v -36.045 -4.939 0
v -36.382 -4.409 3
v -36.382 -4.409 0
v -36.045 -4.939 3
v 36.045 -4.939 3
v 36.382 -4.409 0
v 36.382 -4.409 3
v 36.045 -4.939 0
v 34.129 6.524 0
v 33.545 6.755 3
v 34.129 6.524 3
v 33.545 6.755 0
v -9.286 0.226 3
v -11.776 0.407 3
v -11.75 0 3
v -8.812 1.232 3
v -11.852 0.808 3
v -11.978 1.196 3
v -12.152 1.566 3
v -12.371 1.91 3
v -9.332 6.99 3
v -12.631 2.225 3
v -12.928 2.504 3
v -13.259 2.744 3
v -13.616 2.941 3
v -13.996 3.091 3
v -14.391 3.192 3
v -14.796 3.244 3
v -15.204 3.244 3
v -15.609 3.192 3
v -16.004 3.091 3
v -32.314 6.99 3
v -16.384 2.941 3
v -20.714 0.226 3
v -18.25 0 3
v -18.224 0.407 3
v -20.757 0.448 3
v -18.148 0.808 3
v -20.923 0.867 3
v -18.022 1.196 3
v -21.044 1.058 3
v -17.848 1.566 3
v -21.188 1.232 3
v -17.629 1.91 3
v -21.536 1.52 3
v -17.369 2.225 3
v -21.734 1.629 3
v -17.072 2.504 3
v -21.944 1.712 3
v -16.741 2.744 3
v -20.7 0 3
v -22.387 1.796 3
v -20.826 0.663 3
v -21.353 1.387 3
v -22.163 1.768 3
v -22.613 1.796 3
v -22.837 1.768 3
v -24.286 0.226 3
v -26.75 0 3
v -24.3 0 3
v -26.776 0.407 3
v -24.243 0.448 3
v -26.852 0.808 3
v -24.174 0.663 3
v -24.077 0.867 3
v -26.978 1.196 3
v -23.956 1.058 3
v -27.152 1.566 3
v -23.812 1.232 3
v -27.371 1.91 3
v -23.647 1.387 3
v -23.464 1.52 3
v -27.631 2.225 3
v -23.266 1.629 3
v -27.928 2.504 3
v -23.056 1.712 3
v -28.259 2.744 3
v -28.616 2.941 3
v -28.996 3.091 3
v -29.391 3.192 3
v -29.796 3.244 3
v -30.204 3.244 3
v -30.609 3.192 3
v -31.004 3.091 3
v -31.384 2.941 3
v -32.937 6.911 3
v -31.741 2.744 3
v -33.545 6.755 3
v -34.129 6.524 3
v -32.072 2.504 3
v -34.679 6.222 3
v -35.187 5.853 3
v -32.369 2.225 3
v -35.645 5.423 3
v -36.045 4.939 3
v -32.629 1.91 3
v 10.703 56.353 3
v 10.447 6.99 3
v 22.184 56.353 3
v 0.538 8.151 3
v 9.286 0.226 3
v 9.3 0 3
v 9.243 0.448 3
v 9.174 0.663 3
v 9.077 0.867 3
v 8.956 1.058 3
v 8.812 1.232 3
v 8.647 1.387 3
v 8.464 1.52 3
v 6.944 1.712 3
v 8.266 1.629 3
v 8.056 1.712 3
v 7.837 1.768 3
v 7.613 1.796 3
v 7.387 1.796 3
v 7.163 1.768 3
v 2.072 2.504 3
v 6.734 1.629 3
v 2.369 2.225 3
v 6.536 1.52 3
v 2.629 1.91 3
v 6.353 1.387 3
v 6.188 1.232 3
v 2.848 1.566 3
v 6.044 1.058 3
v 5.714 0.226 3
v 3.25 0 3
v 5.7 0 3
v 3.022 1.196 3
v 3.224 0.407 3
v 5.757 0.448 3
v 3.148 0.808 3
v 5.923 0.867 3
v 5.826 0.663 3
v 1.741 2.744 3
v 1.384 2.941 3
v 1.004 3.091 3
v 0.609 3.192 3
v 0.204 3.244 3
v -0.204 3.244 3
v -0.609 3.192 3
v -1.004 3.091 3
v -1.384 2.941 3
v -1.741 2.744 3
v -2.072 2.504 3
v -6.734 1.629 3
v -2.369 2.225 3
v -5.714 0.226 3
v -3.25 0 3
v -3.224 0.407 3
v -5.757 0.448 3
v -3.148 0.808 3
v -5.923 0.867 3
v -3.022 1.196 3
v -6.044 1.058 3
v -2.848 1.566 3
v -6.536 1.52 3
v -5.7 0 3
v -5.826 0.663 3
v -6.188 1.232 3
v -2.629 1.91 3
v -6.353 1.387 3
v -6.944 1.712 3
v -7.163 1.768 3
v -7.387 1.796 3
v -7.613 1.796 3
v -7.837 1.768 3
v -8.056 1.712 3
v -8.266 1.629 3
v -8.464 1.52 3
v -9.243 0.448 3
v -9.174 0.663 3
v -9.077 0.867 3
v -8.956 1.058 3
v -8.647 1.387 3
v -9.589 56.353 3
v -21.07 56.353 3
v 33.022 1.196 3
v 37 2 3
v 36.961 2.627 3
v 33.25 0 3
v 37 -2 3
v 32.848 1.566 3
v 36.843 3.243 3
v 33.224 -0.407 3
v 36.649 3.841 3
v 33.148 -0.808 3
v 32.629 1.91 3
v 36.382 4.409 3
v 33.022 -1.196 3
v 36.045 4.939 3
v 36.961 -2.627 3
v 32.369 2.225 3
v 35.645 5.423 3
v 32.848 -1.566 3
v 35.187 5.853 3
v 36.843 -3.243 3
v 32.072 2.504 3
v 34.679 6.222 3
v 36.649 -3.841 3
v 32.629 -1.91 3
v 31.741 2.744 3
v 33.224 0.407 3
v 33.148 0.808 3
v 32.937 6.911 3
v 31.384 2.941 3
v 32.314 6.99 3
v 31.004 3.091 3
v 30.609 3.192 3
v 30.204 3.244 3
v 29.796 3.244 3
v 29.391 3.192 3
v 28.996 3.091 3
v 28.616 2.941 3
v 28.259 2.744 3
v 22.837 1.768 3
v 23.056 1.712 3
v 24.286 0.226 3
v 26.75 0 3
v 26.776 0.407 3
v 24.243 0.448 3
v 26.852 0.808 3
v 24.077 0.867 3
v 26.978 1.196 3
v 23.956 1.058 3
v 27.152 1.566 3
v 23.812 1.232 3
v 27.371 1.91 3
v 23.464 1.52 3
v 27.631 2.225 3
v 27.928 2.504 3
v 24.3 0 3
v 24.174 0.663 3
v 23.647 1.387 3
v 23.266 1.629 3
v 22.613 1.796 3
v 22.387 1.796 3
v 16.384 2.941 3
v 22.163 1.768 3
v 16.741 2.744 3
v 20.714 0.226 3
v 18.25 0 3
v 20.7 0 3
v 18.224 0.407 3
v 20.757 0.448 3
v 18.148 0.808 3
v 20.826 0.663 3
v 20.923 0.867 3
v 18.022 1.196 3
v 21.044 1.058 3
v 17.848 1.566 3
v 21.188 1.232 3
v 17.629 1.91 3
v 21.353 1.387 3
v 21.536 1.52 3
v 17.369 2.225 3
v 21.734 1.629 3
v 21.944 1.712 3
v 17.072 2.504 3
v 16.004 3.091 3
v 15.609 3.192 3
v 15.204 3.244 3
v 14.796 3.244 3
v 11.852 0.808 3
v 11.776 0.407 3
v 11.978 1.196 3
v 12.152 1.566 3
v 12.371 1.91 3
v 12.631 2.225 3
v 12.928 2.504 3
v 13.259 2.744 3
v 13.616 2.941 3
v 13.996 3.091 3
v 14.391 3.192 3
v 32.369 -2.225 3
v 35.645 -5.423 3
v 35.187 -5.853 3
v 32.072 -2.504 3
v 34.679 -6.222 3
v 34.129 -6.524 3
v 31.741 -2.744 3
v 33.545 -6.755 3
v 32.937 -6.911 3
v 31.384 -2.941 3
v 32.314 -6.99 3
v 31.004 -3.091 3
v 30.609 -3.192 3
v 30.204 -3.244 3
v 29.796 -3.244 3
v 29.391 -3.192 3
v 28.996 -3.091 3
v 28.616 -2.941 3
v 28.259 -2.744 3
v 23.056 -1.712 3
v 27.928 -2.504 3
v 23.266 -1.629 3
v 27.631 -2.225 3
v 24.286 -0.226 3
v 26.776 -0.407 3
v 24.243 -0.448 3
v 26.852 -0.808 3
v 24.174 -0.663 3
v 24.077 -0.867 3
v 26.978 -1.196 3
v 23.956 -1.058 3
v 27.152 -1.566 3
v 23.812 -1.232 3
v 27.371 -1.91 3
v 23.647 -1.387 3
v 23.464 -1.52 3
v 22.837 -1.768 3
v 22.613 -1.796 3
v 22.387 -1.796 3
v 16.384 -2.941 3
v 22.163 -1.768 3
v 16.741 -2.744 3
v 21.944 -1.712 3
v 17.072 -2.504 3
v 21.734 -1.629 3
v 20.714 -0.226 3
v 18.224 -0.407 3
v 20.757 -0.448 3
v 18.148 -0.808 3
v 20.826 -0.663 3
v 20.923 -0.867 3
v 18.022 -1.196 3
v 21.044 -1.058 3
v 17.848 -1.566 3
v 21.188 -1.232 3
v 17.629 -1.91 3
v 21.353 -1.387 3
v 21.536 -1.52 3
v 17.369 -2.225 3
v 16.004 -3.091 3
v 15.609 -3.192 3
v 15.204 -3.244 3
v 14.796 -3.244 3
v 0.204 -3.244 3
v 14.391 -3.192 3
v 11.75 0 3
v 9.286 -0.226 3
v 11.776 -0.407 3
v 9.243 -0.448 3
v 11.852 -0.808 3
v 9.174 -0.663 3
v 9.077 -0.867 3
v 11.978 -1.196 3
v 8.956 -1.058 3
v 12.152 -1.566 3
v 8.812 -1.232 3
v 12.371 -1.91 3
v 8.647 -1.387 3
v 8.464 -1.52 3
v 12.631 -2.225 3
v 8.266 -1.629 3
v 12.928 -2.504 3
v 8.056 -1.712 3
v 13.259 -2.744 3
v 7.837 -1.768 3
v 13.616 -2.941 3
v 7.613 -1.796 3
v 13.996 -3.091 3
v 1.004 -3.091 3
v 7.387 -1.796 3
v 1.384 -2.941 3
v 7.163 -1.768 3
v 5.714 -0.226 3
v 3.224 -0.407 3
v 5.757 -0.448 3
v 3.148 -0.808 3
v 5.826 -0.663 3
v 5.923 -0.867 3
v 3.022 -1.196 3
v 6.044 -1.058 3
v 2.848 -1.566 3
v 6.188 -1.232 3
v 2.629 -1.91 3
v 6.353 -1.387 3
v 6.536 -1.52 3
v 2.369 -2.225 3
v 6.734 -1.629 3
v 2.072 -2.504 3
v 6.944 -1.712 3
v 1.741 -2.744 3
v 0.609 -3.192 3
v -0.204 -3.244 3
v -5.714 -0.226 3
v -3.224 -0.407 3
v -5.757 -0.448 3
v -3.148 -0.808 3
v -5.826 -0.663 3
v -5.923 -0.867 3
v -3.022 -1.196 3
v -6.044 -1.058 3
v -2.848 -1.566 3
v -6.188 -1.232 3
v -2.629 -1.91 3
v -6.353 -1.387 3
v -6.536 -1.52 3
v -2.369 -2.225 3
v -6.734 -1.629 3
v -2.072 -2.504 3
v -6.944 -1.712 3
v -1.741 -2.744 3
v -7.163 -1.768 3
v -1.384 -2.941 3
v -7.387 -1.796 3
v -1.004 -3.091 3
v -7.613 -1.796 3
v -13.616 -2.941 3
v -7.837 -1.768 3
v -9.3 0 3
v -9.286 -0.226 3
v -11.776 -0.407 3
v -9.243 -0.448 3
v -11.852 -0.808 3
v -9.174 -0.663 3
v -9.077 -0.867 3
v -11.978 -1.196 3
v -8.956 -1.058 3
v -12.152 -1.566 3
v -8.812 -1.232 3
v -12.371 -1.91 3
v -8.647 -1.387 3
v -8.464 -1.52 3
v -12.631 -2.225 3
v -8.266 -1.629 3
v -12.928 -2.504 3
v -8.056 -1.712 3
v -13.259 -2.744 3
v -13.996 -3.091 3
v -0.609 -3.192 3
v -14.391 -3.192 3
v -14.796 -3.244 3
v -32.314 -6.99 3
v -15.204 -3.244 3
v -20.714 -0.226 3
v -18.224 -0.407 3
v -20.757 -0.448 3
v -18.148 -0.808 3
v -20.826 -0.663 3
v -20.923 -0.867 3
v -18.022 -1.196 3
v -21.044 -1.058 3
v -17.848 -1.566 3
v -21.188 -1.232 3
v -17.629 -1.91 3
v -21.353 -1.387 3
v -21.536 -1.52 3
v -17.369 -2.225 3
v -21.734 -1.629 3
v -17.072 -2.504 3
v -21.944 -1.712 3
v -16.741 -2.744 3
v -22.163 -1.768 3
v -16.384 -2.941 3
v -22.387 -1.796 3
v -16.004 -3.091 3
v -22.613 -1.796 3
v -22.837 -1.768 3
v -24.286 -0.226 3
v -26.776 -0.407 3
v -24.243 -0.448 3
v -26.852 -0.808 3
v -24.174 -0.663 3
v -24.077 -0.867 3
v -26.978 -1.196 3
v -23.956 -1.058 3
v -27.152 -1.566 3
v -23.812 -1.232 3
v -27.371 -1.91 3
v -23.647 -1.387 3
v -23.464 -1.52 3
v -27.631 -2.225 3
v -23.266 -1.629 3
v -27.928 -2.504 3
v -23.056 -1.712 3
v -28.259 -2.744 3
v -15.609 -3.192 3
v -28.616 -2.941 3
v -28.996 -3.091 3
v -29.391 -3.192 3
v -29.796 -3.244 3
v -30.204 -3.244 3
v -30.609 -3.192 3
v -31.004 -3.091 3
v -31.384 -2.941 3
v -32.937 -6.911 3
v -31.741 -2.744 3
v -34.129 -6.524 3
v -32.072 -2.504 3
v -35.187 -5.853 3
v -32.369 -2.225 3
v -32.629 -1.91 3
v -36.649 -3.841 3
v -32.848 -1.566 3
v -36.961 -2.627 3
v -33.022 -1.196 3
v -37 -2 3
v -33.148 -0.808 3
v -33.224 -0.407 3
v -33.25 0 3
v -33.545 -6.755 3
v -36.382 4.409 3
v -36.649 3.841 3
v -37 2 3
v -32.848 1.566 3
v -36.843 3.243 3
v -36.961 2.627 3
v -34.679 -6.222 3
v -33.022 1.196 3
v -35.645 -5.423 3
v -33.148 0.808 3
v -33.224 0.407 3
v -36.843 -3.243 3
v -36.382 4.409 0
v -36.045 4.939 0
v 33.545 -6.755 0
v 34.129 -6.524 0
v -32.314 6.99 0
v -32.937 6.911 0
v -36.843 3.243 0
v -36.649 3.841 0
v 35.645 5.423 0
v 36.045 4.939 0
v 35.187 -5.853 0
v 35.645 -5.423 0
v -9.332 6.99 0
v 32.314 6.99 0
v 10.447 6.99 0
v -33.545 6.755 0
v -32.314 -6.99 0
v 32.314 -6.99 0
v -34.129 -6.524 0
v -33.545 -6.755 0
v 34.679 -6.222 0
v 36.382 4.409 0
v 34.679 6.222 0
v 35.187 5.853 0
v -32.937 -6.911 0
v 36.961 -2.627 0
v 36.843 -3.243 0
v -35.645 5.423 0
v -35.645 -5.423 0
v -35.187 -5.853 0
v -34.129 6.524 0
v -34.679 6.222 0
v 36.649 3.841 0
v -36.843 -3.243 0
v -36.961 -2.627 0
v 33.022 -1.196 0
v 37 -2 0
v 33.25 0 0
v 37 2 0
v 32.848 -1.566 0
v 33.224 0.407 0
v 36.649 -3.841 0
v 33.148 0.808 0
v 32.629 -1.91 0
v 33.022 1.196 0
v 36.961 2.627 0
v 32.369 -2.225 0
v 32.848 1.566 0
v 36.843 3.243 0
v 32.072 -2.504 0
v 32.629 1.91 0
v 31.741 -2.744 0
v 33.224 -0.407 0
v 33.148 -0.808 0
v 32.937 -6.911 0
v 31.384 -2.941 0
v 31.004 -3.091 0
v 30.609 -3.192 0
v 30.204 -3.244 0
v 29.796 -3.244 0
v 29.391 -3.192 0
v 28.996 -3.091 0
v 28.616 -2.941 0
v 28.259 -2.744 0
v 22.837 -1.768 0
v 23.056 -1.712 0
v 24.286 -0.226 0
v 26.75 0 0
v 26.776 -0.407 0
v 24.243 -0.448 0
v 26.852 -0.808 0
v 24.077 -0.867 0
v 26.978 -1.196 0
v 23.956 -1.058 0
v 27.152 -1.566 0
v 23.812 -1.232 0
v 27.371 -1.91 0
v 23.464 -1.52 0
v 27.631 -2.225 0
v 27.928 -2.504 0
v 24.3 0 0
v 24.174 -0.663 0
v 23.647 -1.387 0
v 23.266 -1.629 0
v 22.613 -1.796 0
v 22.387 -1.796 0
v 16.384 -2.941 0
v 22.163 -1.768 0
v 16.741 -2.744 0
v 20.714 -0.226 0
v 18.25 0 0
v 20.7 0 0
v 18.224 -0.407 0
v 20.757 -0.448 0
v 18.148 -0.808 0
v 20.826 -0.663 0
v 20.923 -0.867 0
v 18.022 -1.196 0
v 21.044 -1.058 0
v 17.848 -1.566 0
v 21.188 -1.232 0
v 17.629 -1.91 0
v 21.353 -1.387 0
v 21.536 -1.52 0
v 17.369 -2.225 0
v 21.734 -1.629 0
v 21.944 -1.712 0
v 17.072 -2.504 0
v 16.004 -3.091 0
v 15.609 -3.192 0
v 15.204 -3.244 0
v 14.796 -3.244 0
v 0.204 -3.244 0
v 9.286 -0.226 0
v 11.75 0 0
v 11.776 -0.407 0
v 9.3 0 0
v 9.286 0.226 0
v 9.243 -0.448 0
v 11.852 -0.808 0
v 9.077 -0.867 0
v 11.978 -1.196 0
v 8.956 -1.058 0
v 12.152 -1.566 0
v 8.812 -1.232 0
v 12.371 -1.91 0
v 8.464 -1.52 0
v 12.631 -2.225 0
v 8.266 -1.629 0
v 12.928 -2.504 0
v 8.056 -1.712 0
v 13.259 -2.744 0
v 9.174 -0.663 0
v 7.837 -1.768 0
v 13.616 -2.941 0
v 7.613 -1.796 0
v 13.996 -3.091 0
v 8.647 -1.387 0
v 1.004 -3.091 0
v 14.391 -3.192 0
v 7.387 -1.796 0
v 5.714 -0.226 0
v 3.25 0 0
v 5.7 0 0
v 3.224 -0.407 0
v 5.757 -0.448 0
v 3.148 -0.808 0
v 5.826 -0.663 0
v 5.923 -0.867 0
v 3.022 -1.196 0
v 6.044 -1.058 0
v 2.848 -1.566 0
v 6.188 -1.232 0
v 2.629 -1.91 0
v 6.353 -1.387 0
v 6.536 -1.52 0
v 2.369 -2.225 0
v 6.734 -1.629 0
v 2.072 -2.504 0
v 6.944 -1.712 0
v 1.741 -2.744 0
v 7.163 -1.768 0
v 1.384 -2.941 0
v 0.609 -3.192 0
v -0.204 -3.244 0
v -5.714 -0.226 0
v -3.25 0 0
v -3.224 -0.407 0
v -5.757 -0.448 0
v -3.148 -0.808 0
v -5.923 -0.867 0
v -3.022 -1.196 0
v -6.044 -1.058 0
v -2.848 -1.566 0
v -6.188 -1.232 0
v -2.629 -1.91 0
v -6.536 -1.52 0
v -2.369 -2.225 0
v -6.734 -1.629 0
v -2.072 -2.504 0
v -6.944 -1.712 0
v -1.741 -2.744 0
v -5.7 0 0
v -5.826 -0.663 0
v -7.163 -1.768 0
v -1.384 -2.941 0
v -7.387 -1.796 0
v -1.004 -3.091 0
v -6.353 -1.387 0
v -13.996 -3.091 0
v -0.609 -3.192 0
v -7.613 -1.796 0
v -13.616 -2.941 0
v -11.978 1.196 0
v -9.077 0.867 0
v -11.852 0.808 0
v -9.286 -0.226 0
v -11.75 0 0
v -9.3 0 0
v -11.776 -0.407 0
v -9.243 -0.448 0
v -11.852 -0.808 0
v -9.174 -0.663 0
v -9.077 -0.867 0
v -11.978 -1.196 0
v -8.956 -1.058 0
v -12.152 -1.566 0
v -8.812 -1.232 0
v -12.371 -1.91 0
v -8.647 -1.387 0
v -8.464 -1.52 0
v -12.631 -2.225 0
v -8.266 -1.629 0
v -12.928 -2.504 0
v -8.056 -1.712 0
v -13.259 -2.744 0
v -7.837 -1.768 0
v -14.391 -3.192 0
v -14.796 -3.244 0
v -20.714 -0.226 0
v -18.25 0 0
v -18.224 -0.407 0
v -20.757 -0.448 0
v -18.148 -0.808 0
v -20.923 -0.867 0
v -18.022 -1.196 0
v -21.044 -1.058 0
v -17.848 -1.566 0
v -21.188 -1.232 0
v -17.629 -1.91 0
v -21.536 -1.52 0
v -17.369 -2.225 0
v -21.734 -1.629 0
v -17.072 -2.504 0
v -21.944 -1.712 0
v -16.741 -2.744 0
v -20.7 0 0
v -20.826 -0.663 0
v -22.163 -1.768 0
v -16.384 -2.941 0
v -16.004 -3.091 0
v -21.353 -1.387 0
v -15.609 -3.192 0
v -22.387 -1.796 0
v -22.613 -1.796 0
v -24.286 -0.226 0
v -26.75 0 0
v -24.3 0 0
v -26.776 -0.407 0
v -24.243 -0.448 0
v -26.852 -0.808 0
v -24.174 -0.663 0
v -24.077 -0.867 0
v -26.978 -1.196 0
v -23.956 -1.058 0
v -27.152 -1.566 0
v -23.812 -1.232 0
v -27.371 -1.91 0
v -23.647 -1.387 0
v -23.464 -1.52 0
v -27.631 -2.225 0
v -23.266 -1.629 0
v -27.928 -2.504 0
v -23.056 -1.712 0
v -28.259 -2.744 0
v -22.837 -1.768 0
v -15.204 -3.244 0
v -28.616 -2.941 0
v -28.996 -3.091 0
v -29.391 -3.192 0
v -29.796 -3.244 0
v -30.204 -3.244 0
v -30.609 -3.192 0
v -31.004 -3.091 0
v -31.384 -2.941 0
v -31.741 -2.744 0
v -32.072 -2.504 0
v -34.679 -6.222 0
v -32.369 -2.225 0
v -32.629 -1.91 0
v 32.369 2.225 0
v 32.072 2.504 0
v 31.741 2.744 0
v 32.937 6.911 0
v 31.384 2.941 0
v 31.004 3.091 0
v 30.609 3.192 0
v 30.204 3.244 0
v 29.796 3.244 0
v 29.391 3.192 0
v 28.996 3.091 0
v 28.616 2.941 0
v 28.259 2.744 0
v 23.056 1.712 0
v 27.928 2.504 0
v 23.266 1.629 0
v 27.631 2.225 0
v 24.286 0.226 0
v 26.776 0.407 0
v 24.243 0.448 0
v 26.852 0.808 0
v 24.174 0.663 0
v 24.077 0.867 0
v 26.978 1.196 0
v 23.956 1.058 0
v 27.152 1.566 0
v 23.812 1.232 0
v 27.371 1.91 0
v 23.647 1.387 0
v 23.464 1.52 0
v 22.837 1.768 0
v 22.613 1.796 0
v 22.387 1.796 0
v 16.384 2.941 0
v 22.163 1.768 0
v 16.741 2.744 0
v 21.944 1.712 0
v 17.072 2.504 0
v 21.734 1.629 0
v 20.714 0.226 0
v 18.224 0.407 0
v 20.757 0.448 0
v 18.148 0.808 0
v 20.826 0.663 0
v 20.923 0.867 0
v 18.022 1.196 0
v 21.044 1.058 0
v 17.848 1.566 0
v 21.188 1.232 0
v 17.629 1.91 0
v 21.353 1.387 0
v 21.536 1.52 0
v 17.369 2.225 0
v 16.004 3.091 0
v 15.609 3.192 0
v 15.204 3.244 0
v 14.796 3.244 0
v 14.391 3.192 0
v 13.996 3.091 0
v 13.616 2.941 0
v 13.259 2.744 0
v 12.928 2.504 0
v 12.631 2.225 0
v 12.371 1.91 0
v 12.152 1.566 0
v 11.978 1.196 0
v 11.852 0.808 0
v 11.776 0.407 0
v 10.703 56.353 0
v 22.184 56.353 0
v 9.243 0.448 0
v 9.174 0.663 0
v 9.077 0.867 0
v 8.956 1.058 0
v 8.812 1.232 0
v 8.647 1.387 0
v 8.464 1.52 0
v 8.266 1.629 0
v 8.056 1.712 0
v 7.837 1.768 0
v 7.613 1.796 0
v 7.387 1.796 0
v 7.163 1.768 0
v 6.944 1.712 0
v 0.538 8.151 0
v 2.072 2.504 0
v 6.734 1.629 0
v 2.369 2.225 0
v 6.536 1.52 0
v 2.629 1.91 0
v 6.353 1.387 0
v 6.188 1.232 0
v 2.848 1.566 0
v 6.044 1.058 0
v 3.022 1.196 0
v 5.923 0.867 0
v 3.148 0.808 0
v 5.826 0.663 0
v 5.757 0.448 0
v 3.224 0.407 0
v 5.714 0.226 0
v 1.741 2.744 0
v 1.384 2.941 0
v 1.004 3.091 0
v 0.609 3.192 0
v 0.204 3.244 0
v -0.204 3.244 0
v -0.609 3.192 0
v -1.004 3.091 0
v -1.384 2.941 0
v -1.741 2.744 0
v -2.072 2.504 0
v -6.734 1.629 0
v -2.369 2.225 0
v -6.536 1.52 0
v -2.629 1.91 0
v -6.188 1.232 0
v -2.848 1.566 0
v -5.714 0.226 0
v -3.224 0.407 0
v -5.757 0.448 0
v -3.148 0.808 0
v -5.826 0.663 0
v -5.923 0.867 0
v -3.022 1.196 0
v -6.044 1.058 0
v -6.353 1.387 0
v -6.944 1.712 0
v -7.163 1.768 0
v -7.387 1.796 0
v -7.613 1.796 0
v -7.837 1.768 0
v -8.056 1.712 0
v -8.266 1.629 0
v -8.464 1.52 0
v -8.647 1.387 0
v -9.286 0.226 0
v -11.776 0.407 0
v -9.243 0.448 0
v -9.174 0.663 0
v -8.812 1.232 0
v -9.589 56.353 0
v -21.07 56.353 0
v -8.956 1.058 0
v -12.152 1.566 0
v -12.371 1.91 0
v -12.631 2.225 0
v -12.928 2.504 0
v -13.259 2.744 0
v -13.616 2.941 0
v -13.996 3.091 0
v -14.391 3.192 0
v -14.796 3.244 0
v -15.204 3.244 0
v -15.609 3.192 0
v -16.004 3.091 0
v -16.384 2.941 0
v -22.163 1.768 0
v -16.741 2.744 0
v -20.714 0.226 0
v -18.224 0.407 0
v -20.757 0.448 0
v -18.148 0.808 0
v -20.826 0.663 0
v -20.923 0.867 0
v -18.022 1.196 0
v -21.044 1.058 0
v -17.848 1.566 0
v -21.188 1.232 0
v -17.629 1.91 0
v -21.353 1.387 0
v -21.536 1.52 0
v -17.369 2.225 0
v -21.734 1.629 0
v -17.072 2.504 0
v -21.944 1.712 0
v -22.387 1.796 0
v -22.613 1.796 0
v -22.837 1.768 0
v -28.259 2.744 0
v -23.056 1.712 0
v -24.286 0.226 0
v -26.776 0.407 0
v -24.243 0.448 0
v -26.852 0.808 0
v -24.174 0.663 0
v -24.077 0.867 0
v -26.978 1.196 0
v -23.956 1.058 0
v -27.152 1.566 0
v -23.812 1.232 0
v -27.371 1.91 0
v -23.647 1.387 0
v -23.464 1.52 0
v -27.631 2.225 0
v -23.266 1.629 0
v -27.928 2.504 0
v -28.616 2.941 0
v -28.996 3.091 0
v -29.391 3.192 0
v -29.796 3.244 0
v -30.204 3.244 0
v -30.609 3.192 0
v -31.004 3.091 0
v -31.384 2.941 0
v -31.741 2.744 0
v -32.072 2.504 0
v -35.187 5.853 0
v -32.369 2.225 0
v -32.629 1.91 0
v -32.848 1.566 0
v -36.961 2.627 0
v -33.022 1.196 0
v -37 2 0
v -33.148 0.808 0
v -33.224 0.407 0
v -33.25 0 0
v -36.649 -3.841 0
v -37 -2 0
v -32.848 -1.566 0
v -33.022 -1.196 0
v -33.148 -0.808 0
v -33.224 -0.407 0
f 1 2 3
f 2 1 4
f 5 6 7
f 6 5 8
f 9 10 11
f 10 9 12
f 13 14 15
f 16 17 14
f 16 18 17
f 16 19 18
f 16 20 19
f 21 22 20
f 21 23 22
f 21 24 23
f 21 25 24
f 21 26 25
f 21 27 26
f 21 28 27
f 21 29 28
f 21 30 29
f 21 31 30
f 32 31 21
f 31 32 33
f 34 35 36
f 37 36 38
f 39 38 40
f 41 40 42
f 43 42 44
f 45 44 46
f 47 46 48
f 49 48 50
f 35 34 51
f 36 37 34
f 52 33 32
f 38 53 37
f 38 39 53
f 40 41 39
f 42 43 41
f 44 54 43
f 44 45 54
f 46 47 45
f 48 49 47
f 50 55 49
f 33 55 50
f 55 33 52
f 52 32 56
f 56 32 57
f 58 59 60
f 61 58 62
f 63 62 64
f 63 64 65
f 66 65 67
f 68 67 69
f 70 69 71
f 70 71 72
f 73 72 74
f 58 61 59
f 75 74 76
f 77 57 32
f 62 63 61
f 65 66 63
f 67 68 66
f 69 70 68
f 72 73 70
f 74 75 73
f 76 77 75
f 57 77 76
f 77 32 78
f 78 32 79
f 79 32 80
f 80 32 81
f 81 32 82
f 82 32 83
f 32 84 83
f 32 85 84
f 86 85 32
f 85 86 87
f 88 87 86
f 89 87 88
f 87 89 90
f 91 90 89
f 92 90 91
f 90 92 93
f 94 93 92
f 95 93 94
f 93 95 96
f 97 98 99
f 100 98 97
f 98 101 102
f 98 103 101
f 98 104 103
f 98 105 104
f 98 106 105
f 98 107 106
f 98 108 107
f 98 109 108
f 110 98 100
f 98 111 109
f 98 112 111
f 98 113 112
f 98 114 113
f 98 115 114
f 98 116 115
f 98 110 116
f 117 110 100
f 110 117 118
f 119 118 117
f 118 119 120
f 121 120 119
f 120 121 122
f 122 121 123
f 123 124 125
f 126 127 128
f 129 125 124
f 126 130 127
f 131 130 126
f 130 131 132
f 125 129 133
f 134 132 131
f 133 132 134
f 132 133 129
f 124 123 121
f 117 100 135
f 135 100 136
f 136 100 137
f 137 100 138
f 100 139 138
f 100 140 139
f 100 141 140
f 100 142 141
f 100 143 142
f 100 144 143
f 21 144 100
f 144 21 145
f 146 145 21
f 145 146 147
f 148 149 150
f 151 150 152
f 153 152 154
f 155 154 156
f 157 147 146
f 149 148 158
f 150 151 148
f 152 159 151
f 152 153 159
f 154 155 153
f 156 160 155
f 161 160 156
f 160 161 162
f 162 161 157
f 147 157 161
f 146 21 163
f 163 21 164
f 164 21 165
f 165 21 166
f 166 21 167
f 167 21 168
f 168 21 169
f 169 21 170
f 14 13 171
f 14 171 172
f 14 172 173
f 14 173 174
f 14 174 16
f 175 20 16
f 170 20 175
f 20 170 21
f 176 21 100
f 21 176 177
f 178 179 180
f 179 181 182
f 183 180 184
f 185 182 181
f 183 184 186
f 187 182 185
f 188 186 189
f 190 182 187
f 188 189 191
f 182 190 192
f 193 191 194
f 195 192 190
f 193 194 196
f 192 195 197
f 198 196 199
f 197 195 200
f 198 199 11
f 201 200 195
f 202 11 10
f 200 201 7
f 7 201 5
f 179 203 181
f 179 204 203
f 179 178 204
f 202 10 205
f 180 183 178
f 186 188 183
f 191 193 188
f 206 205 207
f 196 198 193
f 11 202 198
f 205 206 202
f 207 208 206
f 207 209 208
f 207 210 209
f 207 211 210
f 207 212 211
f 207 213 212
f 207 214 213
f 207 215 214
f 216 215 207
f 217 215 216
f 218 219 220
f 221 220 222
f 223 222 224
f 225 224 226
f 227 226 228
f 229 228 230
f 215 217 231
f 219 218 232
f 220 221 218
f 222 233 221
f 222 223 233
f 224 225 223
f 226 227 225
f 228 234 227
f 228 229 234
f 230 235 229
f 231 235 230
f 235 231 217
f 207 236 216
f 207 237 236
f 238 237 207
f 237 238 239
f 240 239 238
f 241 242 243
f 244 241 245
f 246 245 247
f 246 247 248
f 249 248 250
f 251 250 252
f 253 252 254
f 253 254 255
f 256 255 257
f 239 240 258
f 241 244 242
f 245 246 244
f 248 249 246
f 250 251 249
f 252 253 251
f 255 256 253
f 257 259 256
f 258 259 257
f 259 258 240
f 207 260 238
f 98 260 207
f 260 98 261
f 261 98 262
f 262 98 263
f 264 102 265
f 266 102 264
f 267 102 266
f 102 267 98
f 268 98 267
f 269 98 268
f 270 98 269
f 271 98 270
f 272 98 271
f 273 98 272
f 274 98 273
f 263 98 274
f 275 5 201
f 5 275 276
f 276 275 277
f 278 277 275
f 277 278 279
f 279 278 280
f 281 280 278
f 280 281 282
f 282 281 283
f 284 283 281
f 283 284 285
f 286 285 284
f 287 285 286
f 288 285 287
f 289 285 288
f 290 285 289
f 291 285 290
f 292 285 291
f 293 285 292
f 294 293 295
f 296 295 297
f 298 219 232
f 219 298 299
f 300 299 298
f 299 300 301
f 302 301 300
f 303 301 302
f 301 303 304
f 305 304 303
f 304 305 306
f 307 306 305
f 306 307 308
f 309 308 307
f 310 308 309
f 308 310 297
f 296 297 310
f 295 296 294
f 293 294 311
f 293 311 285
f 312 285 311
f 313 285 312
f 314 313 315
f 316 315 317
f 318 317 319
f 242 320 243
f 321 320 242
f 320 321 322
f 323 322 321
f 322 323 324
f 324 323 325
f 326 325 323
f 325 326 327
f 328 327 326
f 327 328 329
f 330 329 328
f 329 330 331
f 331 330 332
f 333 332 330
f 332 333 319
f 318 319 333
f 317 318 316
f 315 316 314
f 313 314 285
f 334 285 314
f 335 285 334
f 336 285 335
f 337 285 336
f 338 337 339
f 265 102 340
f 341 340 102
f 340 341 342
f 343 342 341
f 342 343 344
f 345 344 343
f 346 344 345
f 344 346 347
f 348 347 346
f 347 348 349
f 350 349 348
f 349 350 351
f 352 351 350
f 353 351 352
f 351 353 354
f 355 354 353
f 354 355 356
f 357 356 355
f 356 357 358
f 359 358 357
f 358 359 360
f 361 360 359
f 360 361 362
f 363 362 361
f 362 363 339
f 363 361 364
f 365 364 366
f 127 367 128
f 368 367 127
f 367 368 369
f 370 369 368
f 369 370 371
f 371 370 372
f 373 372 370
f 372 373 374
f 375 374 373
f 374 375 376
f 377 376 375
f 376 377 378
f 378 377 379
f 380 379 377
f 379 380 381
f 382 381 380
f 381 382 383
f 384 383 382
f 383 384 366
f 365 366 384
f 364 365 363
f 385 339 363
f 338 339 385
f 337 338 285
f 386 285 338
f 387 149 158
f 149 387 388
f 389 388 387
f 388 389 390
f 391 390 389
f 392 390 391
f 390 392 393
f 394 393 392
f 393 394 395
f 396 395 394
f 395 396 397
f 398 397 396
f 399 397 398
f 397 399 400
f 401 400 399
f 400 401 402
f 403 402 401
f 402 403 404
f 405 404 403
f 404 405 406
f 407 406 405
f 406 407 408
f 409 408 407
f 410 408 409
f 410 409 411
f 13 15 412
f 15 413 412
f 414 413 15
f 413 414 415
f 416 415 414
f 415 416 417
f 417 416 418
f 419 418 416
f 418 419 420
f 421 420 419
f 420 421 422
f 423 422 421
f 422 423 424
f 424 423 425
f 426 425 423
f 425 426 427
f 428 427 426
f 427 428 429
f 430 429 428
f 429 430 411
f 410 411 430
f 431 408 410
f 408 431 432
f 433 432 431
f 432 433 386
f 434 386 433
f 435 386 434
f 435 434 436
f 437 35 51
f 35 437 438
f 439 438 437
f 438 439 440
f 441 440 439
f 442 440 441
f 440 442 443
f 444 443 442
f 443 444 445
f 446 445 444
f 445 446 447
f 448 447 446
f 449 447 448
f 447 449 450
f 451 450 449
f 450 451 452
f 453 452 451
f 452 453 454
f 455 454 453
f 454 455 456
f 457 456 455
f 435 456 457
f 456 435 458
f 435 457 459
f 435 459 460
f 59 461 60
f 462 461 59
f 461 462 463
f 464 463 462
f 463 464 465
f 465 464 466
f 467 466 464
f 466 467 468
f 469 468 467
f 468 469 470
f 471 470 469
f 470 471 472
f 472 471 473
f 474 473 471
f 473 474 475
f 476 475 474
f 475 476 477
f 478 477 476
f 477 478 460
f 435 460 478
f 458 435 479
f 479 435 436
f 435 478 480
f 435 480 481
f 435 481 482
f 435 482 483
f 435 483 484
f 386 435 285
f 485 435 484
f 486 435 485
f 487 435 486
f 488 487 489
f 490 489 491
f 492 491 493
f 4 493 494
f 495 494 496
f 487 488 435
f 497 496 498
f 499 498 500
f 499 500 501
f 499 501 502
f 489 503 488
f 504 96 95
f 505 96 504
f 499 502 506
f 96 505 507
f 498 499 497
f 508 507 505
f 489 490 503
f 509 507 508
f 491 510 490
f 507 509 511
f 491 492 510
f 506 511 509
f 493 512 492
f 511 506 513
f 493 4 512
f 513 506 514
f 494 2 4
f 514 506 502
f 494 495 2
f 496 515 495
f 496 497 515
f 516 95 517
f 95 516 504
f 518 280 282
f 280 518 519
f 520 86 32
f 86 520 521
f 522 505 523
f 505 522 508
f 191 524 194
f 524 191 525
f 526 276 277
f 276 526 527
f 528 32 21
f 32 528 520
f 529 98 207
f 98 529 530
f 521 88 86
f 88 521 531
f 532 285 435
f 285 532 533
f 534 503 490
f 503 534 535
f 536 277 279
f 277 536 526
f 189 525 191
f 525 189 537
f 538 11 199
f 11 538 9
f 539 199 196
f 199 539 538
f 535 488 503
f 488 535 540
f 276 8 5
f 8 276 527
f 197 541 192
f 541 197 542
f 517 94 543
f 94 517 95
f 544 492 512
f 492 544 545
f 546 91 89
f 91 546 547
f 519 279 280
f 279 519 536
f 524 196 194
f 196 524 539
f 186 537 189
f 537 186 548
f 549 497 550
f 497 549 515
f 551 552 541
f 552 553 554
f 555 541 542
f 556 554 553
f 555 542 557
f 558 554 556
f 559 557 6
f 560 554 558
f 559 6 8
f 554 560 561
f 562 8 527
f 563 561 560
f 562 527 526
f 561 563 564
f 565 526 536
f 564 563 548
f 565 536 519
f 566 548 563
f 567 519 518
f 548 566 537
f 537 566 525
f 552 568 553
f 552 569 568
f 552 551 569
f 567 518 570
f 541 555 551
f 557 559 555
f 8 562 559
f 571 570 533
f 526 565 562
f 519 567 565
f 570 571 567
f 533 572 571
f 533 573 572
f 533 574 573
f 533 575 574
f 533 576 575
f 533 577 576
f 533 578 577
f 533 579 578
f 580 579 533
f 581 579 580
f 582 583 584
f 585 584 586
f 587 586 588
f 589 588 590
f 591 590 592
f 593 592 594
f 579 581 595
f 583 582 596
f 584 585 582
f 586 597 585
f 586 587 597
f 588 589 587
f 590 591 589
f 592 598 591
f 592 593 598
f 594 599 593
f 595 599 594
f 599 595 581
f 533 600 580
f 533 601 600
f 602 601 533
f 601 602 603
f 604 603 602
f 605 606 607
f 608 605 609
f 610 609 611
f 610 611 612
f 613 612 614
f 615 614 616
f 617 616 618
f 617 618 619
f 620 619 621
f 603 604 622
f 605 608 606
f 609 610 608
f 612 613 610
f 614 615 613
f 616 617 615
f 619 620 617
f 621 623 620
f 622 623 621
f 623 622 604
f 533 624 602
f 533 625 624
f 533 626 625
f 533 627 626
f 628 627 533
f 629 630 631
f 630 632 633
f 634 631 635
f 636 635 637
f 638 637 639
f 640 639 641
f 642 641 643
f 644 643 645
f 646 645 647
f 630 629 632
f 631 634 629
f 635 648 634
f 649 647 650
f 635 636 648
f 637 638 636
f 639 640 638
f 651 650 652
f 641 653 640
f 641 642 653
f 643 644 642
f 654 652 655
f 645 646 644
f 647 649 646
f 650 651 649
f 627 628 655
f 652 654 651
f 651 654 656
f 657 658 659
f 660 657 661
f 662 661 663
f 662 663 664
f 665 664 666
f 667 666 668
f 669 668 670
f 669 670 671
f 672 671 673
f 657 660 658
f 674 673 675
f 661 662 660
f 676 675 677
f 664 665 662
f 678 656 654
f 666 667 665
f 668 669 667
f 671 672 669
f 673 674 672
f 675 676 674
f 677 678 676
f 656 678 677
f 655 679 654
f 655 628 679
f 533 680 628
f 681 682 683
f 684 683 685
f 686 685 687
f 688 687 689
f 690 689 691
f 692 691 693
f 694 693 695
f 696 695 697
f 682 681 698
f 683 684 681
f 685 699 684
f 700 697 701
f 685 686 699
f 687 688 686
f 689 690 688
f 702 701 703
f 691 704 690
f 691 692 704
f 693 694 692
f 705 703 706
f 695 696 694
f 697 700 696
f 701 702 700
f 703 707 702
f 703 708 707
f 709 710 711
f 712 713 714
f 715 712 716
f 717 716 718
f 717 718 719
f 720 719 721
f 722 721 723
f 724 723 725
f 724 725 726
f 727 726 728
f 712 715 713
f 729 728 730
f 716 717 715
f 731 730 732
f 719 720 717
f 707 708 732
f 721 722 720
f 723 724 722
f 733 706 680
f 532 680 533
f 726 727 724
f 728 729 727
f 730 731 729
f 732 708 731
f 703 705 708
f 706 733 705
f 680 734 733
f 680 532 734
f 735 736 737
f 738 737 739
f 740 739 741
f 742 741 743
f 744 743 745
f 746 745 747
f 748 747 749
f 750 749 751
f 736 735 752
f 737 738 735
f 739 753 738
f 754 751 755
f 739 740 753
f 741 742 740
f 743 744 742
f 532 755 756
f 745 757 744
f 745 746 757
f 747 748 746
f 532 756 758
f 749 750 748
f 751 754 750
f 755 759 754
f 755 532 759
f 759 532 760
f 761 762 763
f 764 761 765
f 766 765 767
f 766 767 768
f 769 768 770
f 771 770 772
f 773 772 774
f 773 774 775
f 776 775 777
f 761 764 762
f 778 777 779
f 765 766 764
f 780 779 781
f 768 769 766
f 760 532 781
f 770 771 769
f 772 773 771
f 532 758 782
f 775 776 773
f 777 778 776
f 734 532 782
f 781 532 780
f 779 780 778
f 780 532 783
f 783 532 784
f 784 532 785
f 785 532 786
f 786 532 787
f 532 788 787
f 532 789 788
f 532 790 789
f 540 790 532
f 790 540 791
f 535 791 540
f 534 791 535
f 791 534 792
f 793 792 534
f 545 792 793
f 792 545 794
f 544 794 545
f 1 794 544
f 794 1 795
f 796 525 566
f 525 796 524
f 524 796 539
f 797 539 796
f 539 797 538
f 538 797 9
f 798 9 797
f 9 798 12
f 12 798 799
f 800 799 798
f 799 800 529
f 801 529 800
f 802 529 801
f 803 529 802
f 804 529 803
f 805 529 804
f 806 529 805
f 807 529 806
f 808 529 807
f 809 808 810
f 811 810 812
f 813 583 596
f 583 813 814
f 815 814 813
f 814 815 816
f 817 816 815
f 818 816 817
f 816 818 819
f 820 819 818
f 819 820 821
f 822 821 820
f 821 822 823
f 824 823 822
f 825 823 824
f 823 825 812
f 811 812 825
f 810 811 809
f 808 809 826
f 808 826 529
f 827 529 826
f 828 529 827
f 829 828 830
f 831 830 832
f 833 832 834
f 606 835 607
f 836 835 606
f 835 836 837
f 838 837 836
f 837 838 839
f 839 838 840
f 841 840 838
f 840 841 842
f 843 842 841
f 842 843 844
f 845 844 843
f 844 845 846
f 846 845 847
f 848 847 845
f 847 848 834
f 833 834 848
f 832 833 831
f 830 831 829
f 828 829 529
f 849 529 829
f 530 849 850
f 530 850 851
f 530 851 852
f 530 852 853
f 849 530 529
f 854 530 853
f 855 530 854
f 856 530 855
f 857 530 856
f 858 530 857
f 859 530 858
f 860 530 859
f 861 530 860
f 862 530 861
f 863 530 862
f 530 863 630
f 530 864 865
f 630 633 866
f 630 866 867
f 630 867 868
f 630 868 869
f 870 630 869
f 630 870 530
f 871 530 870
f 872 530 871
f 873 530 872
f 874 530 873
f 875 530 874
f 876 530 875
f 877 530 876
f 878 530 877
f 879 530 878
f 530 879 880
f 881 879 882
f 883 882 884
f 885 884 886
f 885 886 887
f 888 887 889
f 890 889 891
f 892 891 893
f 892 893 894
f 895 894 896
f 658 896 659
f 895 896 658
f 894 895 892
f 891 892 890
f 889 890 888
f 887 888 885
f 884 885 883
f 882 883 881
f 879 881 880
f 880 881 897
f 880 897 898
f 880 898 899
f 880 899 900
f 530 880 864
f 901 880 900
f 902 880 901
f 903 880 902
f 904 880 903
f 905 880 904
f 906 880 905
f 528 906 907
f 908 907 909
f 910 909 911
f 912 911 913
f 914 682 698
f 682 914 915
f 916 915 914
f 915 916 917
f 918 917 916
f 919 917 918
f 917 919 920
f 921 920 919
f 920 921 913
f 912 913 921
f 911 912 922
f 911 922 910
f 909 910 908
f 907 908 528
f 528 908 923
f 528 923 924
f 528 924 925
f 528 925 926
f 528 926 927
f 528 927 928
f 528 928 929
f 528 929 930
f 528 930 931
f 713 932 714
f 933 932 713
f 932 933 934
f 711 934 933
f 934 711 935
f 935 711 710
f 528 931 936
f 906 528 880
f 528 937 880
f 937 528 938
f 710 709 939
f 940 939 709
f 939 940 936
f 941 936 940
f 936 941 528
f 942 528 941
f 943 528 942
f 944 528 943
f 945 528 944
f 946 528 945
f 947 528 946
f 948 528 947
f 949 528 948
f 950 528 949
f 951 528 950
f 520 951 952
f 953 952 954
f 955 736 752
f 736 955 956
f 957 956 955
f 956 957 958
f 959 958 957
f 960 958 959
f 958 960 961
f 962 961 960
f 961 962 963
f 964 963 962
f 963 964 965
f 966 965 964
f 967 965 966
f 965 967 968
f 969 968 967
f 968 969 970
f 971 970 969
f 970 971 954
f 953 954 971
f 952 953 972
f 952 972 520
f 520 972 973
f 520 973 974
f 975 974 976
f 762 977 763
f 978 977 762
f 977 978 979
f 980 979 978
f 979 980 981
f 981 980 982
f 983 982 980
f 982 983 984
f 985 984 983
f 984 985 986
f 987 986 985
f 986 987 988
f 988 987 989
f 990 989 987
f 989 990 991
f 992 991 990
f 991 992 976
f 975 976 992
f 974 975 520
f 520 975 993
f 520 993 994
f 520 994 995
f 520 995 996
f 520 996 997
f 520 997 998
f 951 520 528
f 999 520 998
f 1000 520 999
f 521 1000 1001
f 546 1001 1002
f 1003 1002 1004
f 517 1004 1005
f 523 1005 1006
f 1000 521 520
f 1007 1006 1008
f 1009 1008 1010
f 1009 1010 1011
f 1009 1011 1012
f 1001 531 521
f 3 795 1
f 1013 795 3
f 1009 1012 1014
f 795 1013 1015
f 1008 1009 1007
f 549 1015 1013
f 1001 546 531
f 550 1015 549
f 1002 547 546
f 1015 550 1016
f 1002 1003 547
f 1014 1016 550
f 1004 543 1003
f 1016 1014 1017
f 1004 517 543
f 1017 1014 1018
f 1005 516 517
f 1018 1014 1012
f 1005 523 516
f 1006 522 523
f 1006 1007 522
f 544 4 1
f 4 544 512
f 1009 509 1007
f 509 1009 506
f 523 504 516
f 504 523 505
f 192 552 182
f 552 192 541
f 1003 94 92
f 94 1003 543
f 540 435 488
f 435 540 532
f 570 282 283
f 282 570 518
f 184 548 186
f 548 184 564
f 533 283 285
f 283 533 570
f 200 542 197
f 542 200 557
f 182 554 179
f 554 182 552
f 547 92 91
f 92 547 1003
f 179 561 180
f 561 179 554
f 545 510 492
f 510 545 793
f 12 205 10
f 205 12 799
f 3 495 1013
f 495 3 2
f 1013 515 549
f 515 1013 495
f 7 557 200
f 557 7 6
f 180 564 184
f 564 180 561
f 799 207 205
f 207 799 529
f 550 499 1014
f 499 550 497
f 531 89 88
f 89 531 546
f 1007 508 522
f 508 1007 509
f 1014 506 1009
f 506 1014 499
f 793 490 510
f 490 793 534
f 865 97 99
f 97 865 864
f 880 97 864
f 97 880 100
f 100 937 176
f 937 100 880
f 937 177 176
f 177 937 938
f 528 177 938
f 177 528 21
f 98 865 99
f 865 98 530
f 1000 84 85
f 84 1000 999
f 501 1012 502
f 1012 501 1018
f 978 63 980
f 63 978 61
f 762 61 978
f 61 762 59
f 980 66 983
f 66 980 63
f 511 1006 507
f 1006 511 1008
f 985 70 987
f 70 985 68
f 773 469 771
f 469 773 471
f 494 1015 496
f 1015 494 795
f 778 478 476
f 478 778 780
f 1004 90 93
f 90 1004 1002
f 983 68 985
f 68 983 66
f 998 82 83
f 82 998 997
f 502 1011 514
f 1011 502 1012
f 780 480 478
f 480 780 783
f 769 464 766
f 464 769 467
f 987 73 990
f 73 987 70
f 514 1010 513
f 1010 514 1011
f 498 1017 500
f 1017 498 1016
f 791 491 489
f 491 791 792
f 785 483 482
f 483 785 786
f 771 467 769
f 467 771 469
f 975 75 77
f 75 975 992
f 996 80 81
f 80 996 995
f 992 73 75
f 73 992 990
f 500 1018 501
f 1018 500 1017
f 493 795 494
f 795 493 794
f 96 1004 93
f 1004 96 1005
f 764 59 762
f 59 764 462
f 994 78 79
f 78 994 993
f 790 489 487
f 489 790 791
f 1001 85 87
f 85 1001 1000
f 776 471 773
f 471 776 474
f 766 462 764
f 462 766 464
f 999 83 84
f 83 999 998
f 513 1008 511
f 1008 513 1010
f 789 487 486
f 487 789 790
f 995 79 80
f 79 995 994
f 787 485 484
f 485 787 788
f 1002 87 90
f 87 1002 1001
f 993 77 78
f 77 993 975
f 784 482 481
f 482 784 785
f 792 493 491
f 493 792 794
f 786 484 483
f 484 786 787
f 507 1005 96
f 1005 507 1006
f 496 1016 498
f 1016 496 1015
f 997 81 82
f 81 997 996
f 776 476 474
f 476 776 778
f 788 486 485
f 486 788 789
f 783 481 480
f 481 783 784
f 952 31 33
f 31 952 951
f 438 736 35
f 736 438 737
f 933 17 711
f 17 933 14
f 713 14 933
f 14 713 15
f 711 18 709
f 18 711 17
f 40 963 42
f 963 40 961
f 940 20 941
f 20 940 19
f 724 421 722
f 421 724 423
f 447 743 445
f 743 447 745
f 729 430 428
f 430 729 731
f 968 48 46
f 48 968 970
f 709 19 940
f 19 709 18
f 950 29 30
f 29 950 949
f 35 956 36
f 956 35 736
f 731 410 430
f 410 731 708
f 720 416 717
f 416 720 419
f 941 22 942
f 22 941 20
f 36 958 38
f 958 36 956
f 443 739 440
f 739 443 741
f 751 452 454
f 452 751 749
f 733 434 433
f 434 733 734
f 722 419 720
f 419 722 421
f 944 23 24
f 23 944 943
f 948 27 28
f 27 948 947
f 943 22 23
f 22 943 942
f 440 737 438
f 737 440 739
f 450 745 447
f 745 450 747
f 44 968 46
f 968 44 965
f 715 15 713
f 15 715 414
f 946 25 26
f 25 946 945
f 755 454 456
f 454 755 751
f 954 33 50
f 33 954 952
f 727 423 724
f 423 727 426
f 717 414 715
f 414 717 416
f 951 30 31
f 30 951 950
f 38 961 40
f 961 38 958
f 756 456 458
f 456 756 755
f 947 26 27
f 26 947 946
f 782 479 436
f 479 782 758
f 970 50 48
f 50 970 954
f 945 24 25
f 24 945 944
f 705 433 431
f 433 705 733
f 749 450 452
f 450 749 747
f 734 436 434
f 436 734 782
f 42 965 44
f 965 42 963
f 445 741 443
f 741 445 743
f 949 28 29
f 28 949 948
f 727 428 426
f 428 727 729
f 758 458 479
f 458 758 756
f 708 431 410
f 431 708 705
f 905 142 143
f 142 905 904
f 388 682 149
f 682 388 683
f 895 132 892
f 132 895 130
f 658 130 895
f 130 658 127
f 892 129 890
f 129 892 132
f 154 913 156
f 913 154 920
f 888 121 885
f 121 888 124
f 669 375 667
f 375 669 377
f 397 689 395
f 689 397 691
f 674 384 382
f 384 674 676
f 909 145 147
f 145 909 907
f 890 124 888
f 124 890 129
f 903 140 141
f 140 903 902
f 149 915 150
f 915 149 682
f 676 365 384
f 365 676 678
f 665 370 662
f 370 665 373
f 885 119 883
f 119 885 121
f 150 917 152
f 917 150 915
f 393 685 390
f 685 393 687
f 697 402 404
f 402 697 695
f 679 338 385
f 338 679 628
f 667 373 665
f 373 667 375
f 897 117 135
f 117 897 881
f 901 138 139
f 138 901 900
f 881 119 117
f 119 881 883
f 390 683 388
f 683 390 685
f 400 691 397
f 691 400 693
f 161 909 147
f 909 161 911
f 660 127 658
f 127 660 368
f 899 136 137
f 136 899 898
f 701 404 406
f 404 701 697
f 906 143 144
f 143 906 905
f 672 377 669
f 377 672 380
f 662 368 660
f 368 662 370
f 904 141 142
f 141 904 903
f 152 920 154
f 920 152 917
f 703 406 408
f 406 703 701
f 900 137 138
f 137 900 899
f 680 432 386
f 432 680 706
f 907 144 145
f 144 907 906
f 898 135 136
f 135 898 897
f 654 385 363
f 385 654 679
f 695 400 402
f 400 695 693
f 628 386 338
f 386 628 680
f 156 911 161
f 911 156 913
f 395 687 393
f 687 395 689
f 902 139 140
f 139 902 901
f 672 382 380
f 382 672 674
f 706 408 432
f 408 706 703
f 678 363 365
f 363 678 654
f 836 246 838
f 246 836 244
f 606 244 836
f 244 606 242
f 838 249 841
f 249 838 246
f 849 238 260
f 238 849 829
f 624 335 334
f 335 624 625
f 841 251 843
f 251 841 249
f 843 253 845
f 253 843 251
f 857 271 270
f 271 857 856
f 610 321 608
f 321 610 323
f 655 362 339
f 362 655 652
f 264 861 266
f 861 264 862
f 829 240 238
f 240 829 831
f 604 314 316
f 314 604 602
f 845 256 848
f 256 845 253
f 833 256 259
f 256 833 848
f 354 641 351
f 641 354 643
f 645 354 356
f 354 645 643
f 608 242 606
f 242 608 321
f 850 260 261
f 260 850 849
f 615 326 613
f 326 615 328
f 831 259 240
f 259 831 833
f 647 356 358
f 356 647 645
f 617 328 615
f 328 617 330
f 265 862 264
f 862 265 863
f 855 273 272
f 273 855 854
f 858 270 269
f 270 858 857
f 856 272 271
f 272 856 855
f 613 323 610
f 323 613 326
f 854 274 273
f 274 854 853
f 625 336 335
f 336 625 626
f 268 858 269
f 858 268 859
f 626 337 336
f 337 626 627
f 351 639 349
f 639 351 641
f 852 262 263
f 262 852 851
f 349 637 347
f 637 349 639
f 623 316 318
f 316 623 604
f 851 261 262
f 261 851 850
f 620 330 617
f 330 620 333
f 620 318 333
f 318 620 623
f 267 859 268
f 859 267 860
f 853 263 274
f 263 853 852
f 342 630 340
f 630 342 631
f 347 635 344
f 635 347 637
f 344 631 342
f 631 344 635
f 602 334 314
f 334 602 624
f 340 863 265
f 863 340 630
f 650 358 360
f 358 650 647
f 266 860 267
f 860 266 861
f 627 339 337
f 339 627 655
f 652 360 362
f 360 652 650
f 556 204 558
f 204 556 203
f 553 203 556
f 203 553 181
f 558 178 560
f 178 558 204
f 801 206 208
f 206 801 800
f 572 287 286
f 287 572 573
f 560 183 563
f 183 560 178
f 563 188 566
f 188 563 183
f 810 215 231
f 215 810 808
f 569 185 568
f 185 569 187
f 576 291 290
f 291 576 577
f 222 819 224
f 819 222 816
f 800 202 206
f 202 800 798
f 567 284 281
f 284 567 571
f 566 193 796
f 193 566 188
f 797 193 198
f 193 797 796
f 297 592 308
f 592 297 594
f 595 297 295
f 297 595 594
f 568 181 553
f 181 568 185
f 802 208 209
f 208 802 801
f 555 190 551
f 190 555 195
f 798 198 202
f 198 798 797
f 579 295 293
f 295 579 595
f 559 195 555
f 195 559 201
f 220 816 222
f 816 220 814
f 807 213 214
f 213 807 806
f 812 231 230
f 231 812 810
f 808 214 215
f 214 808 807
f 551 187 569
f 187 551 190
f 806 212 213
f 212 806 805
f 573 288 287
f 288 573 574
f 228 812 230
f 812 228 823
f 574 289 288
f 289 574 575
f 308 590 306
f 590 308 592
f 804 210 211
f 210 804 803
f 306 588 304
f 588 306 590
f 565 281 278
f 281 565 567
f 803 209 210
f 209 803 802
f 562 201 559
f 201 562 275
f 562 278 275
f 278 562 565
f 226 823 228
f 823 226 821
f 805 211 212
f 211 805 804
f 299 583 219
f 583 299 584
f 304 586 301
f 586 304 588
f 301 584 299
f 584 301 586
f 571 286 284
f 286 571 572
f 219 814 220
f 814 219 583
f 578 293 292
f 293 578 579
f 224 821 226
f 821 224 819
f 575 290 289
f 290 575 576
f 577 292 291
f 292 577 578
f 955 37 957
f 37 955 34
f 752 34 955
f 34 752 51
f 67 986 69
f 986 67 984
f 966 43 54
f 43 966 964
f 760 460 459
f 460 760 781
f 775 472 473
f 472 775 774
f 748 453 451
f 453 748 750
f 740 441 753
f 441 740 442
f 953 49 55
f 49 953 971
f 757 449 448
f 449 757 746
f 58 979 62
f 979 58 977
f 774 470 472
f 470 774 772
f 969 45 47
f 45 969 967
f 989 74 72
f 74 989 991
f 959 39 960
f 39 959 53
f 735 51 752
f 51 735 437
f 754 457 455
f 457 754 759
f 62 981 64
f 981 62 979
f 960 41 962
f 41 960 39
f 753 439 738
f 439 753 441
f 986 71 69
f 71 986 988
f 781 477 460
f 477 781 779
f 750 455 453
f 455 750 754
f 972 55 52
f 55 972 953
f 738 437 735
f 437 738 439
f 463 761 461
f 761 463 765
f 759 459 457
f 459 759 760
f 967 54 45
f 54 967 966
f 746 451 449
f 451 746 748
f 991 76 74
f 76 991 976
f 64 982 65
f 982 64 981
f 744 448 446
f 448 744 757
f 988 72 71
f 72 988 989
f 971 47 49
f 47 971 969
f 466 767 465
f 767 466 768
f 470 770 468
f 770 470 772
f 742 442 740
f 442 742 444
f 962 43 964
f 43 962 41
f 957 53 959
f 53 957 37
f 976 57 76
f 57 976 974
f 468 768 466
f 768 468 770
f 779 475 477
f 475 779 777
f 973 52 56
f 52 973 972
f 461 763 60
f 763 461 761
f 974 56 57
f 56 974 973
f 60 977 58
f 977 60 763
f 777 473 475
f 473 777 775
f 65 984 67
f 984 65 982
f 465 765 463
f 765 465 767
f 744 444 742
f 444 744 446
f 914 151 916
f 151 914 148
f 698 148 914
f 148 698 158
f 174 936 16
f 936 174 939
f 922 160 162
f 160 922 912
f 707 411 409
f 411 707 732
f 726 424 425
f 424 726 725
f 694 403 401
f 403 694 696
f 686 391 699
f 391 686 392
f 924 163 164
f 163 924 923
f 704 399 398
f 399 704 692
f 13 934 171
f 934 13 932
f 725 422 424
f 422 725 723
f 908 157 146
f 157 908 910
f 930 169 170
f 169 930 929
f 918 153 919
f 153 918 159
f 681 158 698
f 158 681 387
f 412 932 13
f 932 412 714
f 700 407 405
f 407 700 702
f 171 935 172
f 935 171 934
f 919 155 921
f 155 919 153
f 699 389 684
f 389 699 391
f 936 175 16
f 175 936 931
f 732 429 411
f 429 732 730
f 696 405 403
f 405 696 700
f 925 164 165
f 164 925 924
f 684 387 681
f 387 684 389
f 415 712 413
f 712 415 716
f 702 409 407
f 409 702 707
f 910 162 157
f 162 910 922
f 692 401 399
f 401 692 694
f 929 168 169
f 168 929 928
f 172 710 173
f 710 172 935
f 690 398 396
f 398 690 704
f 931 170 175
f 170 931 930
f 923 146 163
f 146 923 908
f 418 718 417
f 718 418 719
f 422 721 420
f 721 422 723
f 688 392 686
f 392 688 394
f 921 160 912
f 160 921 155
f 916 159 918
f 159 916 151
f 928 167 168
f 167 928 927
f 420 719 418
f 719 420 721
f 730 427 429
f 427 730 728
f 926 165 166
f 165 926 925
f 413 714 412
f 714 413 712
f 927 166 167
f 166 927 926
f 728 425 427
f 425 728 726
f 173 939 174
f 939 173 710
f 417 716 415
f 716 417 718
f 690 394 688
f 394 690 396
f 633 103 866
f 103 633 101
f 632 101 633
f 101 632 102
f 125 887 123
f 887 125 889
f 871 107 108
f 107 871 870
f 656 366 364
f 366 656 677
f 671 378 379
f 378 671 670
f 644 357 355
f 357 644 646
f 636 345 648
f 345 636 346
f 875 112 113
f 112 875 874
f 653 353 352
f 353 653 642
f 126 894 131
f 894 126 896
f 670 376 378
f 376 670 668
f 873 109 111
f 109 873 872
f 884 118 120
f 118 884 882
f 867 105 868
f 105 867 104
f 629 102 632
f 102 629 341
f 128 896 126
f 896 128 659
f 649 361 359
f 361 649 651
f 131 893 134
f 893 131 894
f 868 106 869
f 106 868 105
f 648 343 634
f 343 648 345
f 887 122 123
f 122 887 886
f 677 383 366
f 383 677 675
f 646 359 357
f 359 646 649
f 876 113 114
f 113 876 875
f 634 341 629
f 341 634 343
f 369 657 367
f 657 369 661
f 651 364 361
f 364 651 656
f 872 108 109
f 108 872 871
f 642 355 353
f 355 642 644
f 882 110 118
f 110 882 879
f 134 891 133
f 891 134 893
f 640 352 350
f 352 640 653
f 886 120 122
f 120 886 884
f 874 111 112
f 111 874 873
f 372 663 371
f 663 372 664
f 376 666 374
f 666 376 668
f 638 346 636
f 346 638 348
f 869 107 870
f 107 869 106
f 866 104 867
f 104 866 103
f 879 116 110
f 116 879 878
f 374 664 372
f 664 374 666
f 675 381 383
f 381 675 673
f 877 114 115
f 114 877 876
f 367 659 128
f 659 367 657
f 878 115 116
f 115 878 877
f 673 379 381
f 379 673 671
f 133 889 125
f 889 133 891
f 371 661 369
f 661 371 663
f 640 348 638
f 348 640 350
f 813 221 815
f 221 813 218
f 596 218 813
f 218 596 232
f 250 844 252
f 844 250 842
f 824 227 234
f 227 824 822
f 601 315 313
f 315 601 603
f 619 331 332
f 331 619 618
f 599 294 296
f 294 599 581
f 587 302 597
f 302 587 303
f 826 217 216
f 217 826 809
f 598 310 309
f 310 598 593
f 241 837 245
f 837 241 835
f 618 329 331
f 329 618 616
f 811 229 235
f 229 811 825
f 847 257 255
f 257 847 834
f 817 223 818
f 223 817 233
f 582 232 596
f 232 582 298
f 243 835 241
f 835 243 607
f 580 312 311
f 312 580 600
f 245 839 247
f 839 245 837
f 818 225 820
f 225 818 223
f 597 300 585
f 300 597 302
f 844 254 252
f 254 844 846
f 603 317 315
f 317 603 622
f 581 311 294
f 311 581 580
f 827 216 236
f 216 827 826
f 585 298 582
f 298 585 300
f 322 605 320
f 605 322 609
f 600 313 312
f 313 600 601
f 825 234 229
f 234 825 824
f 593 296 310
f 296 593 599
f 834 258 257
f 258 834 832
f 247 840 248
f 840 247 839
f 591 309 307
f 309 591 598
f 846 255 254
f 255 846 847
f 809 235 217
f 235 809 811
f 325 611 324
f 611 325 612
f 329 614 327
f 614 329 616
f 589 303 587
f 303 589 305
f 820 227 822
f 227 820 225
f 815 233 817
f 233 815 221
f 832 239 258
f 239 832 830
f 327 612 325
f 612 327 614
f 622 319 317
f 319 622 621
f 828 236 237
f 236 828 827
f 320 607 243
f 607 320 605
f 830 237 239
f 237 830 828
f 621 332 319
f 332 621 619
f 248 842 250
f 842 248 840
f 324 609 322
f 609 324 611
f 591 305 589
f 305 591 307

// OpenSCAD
$fn = 50;


difference() {
	union() {
		hull() {
			translate(v = [-32.0000000000, 2.0000000000, 0]) {
				cylinder(h = 3, r = 5);
			}
			translate(v = [32.0000000000, 2.0000000000, 0]) {
				cylinder(h = 3, r = 5);
			}
			translate(v = [-32.0000000000, -2.0000000000, 0]) {
				cylinder(h = 3, r = 5);
			}
			translate(v = [32.0000000000, -2.0000000000, 0]) {
				cylinder(h = 3, r = 5);
			}
		}
		translate(v = [0, 55, 0]) {
			linear_extrude(height = 3) {
				text(font = "DejaVu Sans Mono:style=Bold", halign = "center", size = 57.0000000000, text = "V", valign = "top");
			}
		}
	}
	union() {
		translate(v = [-30.0000000000, 0.0000000000, 0]) {
			translate(v = [0, 0, -100]) {
				cylinder(h = 200, r = 3.2500000000);
			}
		}
		translate(v = [-15.0000000000, 0.0000000000, 0]) {
			translate(v = [0, 0, -100]) {
				cylinder(h = 200, r = 3.2500000000);
			}
		}
		translate(v = [0, 0, -100]) {
			cylinder(h = 200, r = 3.2500000000);
		}
		translate(v = [15.0000000000, 0.0000000000, 0]) {
			translate(v = [0, 0, -100]) {
				cylinder(h = 200, r = 3.2500000000);
			}
		}
		translate(v = [30.0000000000, 0.0000000000, 0]) {
			translate(v = [0, 0, -100]) {
				cylinder(h = 200, r = 3.2500000000);
			}
		}
		translate(v = [-30.0000000000, 0.0000000000, 0]) {
			translate(v = [0, 0, -100]) {
				cylinder(h = 200, r = 1.8000000000);
			}
		}
		translate(v = [-22.5000000000, 0.0000000000, 0]) {
			translate(v = [0, 0, -100]) {
				cylinder(h = 200, r = 1.8000000000);
			}
		}
		translate(v = [-15.0000000000, 0.0000000000, 0]) {
			translate(v = [0, 0, -100]) {
				cylinder(h = 200, r = 1.8000000000);
			}
		}
		translate(v = [-7.5000000000, 0.0000000000, 0]) {
			translate(v = [0, 0, -100]) {
				cylinder(h = 200, r = 1.8000000000);
			}
		}
		translate(v = [0, 0, -100]) {
			cylinder(h = 200, r = 1.8000000000);
		}
		translate(v = [7.5000000000, 0.0000000000, 0]) {
			translate(v = [0, 0, -100]) {
				cylinder(h = 200, r = 1.8000000000);
			}
		}
		translate(v = [15.0000000000, 0.0000000000, 0]) {
			translate(v = [0, 0, -100]) {
				cylinder(h = 200, r = 1.8000000000);
			}
		}
		translate(v = [22.5000000000, 0.0000000000, 0]) {
			translate(v = [0, 0, -100]) {
				cylinder(h = 200, r = 1.8000000000);
			}
		}
		translate(v = [30.0000000000, 0.0000000000, 0]) {
			translate(v = [0, 0, -100]) {
				cylinder(h = 200, r = 1.8000000000);
			}
		}
	}
}
